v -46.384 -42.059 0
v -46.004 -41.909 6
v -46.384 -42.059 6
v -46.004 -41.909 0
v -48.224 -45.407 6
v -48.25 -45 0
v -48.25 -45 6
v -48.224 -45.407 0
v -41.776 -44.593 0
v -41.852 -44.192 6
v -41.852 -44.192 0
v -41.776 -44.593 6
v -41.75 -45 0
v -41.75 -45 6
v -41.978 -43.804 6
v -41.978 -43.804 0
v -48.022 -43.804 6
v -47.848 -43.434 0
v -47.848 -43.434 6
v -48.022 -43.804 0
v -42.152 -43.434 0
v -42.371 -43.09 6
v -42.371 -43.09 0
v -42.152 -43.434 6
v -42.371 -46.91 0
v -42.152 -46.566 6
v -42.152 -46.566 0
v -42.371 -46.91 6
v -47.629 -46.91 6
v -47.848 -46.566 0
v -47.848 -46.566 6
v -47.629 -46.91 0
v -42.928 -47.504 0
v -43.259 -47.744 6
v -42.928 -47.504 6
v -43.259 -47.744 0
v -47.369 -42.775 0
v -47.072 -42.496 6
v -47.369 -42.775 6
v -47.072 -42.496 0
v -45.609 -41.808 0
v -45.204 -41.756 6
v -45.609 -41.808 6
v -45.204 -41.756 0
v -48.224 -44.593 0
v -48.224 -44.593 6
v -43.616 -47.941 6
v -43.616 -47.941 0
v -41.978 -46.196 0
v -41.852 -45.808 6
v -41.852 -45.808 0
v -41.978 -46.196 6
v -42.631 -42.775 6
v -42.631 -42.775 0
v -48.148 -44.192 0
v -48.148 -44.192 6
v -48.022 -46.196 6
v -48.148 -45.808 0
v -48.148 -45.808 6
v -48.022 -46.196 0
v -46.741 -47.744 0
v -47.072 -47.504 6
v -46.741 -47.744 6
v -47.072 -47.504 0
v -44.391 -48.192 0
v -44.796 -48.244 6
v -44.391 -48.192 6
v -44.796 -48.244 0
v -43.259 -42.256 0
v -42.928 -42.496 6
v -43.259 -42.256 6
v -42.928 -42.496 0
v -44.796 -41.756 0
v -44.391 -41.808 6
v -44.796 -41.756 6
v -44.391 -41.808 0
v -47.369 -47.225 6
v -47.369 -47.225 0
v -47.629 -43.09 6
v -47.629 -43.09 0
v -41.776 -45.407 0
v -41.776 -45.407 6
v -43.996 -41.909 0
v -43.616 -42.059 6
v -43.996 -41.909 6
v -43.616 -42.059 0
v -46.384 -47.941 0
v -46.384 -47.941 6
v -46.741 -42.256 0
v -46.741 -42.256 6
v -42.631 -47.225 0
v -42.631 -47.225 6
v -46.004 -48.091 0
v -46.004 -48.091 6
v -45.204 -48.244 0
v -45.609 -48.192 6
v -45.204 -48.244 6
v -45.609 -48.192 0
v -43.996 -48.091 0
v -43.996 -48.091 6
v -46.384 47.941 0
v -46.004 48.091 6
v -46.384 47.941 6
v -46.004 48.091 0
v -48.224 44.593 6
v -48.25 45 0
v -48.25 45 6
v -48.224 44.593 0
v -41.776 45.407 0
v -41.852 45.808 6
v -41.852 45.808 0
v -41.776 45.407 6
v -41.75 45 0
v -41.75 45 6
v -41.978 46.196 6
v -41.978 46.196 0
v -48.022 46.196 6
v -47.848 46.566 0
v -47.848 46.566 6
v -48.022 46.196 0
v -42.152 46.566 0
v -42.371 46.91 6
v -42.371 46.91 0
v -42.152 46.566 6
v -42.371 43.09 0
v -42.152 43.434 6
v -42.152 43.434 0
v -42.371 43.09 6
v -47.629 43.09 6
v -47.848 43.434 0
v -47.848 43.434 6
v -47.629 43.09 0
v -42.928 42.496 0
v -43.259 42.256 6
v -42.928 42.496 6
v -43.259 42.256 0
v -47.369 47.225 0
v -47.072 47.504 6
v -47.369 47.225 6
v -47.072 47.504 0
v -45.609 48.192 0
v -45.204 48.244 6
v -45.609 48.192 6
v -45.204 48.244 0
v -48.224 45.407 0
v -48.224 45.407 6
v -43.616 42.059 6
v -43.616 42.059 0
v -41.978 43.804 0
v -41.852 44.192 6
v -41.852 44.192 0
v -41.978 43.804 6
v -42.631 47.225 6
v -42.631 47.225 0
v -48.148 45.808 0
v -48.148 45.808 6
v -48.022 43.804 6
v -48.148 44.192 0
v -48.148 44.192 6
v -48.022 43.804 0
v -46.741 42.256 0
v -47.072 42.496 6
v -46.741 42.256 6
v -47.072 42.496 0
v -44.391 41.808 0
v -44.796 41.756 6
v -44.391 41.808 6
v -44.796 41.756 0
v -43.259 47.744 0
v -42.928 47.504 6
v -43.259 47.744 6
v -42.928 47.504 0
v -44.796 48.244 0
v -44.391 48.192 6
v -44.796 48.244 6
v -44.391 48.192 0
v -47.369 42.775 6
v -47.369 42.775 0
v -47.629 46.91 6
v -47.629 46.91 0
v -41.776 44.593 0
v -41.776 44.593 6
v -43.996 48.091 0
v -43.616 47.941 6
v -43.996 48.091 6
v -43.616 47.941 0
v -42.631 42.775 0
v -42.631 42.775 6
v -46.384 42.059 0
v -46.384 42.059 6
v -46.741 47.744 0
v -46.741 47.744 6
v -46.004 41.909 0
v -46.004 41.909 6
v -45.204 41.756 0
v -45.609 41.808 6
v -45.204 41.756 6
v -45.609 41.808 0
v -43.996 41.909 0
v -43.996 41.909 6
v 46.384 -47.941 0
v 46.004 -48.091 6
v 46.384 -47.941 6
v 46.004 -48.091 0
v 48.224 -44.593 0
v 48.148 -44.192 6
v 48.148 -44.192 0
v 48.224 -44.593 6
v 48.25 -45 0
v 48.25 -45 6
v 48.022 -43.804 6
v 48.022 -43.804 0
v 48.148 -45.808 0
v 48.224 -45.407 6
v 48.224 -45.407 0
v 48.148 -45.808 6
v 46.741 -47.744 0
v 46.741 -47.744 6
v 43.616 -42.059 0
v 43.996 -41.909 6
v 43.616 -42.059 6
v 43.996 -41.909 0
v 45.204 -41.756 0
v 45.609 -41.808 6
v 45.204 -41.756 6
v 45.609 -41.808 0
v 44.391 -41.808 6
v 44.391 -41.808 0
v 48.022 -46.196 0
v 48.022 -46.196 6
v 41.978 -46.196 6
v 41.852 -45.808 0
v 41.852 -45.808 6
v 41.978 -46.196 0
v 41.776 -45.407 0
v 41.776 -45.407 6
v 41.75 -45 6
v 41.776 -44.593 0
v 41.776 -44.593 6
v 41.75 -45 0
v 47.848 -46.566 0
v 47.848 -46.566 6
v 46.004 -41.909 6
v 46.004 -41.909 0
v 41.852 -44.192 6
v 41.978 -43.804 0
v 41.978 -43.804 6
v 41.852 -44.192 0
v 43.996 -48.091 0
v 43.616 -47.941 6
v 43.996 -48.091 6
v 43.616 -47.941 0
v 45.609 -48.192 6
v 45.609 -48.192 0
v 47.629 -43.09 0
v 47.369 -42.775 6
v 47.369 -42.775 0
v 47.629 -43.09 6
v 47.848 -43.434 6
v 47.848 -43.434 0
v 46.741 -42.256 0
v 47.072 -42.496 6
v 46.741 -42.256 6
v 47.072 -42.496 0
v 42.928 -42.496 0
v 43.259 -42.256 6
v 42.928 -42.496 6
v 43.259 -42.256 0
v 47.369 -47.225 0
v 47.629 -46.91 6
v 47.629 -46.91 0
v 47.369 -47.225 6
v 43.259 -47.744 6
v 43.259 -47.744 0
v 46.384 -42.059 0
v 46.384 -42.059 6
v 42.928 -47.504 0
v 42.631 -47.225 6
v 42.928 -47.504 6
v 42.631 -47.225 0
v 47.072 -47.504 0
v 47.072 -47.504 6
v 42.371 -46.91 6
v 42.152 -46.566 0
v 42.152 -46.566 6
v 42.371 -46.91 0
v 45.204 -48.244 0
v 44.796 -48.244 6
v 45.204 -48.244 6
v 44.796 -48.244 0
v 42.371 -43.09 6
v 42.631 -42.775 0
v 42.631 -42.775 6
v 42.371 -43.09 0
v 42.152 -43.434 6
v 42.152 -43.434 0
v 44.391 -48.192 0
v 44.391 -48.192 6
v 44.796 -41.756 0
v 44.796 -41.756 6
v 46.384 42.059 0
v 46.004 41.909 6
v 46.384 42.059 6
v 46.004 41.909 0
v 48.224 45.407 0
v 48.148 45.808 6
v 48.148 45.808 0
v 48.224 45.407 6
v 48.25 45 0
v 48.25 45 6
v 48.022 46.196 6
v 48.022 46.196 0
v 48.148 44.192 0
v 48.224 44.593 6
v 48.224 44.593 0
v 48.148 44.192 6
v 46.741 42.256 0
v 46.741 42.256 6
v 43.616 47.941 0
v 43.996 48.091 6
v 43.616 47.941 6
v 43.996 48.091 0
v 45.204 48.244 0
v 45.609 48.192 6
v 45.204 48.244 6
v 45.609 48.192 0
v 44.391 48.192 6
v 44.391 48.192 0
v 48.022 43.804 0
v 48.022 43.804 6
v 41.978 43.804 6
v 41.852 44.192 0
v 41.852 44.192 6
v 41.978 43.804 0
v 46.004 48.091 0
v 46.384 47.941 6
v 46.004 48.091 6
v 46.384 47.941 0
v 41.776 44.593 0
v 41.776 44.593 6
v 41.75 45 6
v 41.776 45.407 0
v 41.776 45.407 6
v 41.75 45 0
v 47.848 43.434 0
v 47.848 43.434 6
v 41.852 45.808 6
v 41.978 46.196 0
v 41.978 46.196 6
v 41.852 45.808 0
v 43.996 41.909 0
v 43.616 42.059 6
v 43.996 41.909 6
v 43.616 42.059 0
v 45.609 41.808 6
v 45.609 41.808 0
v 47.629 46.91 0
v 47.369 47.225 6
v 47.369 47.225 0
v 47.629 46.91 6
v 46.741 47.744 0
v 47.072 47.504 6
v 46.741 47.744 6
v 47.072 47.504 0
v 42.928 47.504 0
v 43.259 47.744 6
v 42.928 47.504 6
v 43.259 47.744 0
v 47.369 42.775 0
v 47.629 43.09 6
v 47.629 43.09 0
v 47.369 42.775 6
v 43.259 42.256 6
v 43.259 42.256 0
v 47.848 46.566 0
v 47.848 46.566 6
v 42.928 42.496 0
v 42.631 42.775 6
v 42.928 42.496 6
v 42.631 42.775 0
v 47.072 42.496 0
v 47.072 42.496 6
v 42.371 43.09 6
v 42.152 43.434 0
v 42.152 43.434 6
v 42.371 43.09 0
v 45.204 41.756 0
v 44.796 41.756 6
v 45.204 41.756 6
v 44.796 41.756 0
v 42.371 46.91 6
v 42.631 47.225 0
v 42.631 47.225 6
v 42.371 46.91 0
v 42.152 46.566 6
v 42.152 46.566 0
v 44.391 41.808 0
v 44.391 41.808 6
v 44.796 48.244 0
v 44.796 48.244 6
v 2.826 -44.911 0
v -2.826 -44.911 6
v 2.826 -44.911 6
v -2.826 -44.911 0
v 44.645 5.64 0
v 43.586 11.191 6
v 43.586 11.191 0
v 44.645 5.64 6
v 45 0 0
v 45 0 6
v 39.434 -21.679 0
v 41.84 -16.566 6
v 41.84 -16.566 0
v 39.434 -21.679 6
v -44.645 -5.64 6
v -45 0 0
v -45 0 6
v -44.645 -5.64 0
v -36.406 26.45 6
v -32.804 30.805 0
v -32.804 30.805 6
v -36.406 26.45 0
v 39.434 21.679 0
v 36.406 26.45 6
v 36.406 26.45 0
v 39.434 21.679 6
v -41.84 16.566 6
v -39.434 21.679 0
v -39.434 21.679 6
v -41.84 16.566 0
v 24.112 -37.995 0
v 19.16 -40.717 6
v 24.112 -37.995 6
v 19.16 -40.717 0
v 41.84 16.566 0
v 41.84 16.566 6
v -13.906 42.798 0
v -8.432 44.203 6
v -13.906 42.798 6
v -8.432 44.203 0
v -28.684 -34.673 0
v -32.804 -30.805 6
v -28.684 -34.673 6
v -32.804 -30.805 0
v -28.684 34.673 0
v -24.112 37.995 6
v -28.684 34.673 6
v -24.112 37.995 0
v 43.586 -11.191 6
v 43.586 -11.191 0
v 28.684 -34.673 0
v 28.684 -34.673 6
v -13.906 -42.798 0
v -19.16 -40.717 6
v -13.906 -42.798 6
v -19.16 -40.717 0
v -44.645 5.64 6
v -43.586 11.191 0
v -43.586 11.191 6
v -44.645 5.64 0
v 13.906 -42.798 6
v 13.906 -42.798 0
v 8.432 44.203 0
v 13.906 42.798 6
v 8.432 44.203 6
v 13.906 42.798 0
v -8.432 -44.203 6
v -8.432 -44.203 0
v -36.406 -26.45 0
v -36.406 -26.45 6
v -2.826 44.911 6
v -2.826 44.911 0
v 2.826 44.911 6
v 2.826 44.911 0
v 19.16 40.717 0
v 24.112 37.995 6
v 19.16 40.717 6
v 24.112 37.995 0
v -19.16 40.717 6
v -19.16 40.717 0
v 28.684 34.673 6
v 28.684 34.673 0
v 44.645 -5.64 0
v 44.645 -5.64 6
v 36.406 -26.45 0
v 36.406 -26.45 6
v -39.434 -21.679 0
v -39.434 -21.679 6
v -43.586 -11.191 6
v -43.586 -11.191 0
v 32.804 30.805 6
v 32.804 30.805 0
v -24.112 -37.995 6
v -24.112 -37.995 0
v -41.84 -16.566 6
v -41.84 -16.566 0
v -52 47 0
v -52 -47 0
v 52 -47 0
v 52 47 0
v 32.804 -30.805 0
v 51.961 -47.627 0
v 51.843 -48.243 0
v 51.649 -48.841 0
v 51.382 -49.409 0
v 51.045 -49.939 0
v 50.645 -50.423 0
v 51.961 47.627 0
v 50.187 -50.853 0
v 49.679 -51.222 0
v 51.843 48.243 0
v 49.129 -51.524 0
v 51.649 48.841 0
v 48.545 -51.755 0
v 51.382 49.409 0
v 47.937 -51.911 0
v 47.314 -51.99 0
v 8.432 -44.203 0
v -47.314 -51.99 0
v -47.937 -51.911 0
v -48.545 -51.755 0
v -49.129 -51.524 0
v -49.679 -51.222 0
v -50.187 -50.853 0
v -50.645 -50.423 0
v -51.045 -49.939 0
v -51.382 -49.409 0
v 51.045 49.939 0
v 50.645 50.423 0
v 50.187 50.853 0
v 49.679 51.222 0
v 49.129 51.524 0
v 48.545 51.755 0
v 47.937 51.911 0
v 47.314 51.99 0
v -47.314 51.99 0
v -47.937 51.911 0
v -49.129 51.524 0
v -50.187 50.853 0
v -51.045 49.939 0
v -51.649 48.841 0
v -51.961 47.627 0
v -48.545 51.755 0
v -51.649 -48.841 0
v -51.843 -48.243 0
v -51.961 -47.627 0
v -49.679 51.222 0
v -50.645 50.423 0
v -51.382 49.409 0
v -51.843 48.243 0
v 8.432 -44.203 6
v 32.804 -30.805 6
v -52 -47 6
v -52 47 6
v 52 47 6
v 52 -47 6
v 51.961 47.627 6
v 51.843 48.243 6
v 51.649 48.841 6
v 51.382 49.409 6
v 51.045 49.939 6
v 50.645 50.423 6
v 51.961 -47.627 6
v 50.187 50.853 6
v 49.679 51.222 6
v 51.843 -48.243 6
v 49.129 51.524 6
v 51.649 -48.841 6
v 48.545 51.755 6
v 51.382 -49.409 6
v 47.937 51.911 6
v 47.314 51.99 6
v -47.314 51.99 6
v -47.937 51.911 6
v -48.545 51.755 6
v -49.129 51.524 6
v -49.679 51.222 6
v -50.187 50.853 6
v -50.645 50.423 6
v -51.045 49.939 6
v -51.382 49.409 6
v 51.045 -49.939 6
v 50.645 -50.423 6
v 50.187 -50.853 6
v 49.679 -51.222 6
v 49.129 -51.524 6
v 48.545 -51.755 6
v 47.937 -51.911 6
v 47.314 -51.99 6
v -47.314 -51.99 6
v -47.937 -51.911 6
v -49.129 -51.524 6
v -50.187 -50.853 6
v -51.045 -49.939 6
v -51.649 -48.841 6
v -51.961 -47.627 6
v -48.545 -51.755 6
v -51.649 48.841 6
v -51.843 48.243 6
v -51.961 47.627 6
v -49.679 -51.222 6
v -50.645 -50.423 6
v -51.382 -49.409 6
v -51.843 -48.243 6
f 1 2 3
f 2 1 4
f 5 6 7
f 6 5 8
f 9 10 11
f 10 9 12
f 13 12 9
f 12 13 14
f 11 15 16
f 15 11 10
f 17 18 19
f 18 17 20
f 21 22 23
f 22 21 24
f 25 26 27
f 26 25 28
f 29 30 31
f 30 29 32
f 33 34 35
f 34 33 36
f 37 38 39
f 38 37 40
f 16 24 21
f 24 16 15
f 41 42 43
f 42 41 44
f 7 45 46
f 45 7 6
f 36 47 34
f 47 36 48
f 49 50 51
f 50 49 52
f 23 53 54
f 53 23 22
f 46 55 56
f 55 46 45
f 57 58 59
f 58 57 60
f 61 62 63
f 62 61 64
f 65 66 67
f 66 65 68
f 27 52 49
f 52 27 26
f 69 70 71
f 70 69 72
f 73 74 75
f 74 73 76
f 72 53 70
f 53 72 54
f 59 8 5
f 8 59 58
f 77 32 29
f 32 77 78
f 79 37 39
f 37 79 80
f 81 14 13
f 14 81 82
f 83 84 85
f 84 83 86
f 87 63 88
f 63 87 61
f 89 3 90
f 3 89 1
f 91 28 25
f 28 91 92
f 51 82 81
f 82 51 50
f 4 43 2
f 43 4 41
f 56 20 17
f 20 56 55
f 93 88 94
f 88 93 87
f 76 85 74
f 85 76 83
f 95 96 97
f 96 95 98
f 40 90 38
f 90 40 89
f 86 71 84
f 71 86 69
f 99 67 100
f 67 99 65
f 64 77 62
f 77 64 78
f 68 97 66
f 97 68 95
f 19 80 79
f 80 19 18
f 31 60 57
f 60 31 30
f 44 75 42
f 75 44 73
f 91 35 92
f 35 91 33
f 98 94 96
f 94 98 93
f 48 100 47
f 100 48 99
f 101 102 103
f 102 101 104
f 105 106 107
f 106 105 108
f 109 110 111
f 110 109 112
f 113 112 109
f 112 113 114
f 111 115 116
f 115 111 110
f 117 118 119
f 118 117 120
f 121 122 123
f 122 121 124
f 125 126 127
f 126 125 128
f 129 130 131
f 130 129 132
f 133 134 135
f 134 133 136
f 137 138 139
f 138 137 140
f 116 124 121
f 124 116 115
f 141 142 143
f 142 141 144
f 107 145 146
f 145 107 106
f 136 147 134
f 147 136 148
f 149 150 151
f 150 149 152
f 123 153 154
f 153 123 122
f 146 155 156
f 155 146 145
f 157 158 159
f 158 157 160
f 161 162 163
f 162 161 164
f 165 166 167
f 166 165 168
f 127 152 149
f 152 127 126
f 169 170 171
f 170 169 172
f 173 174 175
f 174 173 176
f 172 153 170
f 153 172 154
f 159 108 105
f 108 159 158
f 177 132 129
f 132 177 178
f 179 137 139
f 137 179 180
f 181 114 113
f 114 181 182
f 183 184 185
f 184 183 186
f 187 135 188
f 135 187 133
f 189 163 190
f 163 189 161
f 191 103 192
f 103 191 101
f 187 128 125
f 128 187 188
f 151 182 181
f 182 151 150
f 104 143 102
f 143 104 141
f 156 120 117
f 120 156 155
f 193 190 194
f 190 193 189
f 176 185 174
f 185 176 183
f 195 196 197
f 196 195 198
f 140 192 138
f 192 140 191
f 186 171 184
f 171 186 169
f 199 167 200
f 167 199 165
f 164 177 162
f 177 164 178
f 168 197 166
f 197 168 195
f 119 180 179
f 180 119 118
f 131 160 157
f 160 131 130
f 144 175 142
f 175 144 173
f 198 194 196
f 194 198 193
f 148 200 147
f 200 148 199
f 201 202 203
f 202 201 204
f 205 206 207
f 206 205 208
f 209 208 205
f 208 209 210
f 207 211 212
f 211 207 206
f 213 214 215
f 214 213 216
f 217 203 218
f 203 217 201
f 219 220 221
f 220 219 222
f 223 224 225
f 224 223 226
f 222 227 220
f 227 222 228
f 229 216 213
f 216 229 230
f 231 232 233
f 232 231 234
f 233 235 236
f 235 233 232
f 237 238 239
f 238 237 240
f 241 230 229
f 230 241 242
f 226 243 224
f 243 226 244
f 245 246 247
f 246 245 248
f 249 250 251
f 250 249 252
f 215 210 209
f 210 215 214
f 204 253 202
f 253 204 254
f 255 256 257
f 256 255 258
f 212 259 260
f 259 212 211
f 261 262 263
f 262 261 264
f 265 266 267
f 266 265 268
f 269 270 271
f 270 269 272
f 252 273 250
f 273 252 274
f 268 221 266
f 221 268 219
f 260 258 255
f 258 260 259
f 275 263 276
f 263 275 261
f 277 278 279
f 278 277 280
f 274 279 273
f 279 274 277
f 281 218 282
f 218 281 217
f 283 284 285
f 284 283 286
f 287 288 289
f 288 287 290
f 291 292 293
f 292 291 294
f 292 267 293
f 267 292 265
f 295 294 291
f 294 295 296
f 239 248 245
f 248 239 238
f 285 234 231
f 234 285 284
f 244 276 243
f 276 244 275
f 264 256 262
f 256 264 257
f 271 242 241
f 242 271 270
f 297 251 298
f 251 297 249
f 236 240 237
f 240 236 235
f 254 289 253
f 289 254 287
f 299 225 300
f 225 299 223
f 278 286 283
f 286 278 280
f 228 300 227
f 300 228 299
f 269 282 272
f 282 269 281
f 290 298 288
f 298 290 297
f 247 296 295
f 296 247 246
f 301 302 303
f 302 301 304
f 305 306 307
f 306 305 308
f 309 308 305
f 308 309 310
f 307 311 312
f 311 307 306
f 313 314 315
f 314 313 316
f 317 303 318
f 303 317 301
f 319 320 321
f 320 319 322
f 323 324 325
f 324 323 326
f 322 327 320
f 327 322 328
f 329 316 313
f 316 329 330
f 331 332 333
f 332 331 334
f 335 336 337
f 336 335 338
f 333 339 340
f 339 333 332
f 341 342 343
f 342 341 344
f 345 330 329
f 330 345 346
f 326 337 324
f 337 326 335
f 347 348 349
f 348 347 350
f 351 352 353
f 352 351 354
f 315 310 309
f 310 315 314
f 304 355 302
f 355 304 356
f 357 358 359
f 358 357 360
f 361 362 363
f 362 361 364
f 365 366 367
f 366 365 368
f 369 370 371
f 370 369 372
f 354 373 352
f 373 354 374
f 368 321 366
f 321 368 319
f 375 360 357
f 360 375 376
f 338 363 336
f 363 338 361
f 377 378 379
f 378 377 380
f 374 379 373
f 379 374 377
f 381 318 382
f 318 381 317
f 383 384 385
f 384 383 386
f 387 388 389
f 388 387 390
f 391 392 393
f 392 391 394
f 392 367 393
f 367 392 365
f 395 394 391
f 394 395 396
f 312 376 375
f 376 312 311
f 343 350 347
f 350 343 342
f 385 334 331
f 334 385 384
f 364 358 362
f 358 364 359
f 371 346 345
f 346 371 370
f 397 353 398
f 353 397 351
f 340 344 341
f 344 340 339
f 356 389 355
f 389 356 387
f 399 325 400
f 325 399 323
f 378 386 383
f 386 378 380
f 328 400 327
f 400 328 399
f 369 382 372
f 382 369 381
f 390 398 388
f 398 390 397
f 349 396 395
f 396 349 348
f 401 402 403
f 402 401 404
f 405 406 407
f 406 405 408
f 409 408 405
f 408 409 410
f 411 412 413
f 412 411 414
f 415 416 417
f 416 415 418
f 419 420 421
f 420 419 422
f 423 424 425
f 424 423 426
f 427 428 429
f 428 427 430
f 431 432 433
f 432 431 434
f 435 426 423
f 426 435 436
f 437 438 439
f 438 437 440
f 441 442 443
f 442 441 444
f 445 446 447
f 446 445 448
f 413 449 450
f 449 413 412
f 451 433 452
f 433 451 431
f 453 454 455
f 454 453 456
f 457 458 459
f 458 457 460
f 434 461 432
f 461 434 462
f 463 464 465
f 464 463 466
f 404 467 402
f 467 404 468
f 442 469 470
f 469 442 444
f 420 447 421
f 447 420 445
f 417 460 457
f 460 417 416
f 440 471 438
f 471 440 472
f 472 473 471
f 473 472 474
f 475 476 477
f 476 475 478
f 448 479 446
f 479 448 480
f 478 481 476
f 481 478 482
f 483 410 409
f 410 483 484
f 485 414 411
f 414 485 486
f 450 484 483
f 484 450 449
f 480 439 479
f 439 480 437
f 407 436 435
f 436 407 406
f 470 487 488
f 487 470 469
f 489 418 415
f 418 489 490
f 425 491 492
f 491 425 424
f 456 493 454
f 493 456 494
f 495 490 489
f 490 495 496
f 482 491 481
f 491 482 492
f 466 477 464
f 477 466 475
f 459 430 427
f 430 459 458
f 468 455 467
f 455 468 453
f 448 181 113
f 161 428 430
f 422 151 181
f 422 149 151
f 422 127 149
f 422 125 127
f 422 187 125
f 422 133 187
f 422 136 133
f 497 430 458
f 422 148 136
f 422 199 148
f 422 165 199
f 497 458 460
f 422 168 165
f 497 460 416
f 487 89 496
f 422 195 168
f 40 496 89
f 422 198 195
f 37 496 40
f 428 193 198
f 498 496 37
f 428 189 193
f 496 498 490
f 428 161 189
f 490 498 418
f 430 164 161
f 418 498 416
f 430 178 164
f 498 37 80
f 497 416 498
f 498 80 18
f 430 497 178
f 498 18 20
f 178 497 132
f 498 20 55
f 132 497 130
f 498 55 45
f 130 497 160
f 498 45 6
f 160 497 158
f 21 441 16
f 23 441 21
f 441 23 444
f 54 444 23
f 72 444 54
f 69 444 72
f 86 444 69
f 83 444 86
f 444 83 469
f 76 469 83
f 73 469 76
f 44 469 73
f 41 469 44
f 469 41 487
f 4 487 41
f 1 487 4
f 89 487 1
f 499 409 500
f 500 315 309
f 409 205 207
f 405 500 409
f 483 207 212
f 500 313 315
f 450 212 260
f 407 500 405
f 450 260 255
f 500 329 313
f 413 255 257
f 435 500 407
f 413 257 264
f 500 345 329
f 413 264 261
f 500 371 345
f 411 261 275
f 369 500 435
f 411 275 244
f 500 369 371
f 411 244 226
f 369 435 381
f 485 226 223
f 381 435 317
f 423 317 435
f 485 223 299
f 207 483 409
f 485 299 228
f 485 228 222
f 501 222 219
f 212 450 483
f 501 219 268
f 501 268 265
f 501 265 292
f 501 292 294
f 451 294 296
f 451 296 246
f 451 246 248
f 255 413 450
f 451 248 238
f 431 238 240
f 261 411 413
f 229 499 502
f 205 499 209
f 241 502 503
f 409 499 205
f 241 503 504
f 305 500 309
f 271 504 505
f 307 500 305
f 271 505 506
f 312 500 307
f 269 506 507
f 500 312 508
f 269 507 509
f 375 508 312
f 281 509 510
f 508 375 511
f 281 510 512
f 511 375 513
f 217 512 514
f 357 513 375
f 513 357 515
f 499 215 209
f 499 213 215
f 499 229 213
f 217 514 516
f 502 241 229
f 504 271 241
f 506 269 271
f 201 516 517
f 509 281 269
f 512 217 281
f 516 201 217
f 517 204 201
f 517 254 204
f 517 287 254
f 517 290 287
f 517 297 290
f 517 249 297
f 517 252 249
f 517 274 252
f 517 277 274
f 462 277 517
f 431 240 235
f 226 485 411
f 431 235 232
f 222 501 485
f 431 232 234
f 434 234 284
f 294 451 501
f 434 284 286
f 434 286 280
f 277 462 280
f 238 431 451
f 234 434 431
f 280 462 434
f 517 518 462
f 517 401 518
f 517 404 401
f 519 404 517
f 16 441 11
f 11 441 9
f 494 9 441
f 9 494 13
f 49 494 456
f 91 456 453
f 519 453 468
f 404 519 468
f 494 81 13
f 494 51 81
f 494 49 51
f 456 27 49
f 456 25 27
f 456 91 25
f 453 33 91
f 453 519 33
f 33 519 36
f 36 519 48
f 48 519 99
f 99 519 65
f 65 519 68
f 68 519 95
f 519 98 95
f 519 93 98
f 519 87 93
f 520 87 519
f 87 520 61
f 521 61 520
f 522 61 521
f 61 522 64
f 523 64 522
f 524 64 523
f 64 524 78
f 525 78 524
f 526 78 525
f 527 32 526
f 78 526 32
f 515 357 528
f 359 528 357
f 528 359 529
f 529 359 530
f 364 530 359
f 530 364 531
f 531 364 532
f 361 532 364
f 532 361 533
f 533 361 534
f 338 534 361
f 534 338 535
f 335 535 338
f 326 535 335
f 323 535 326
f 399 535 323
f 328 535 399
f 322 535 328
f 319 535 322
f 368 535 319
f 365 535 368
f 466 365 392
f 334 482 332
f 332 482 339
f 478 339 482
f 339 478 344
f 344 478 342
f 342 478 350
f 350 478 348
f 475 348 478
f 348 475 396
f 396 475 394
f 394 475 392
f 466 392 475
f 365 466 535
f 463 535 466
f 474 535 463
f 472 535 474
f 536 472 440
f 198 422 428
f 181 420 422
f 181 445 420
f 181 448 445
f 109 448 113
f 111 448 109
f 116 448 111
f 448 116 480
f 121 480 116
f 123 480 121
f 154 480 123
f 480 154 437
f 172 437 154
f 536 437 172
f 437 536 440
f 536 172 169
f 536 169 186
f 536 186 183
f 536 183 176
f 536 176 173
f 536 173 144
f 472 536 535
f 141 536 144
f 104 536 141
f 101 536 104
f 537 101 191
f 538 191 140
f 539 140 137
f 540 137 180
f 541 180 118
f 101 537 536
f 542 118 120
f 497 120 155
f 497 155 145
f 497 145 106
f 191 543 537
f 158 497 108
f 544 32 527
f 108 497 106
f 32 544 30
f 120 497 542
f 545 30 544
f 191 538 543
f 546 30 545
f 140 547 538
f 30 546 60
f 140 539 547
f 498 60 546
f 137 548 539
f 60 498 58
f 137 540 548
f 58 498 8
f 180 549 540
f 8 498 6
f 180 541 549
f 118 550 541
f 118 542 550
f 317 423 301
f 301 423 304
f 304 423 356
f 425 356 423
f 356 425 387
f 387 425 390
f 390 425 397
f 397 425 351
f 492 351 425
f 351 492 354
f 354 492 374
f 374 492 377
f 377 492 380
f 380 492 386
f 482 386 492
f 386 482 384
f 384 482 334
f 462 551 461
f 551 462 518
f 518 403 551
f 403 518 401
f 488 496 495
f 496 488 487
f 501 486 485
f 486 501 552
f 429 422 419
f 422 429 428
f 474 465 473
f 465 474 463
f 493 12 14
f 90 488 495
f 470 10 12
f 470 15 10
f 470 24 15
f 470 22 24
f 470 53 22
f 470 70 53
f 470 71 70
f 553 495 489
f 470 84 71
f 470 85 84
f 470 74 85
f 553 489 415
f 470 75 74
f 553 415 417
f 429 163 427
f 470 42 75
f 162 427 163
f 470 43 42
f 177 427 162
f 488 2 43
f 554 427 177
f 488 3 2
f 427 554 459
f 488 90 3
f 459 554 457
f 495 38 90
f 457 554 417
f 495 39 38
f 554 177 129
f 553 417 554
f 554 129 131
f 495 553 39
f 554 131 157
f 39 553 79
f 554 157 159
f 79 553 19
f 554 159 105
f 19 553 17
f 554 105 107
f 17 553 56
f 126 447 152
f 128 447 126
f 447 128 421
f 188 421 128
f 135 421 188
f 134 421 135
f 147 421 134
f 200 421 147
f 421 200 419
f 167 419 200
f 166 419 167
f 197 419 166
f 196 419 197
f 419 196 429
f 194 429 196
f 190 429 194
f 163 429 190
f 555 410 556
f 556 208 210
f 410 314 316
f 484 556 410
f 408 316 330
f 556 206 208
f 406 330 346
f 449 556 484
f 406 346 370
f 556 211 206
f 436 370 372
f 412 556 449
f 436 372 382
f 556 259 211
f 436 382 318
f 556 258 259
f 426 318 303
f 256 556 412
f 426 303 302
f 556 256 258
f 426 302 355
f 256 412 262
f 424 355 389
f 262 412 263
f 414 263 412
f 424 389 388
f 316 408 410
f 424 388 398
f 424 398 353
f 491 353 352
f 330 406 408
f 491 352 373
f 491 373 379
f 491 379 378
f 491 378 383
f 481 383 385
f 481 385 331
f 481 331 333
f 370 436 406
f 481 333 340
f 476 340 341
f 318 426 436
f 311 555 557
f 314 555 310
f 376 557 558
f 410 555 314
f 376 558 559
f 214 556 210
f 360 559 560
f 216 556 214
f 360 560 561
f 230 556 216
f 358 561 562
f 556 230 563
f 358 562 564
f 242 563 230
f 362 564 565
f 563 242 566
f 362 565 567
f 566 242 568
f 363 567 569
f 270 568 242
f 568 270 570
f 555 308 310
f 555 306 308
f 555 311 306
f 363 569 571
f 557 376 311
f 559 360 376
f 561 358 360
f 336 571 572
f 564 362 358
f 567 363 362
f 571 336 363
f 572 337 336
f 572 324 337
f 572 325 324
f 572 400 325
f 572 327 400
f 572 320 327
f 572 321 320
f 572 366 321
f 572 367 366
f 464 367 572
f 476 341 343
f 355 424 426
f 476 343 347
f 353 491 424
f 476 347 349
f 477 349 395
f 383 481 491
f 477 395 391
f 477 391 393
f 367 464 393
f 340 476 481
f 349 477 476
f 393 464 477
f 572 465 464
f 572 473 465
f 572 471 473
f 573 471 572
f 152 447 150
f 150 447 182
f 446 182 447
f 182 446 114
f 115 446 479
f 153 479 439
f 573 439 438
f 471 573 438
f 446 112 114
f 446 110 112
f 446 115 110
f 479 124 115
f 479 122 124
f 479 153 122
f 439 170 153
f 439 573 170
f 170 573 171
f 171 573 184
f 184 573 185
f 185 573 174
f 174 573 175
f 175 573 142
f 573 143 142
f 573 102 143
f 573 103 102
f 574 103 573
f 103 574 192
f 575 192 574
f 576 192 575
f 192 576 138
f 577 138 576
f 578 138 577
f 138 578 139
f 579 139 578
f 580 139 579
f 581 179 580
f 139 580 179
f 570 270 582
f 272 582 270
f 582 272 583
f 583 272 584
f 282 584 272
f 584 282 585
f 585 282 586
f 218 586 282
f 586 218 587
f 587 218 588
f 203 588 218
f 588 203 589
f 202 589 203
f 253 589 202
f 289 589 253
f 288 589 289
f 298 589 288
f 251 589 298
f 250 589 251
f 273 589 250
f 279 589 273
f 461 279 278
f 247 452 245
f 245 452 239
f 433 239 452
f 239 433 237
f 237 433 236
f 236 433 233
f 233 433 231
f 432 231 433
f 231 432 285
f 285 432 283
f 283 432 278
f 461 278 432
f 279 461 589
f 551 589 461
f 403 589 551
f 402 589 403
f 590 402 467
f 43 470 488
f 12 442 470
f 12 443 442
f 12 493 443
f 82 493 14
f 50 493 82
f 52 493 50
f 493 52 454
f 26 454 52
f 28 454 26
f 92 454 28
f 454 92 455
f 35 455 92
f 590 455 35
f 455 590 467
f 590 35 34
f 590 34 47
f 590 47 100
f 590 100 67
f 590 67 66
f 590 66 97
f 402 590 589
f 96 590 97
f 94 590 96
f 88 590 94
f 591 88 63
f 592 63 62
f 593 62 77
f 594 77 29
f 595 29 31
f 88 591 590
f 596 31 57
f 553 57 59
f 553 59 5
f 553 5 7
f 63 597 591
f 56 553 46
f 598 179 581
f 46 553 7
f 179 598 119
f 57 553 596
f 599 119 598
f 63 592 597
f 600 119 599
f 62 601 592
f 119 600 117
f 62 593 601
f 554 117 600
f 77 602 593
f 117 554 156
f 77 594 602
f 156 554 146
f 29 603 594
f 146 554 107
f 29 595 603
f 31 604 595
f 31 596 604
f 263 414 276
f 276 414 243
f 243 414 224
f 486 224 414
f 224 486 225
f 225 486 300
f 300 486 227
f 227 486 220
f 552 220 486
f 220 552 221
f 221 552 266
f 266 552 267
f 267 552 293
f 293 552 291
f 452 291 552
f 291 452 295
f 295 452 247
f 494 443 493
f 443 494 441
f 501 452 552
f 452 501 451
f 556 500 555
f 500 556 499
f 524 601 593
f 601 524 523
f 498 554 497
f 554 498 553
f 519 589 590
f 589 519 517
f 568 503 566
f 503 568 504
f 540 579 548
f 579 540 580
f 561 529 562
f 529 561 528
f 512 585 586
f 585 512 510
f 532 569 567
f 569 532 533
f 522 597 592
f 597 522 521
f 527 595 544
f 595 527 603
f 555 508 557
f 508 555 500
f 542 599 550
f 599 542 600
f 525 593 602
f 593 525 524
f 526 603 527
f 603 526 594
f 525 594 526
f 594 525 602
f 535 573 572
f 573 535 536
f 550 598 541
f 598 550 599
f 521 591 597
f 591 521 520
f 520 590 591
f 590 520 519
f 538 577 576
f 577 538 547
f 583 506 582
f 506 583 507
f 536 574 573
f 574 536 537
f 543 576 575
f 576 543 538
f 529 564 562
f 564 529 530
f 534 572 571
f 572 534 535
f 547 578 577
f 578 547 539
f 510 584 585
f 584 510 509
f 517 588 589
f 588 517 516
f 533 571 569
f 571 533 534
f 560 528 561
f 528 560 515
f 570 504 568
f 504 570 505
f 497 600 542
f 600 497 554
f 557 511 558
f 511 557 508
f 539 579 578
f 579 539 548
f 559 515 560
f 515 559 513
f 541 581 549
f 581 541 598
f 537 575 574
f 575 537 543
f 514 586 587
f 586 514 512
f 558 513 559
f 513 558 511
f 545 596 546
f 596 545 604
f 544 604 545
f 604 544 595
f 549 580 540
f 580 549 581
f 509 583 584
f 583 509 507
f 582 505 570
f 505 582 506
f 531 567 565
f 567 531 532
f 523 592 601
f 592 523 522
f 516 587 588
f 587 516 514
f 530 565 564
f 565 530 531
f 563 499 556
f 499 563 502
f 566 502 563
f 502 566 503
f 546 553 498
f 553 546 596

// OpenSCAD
$fn = 50;

difference() {
	union() {
		hull() {
			translate(v = [-47.0, 47.0, 0]) {
				cylinder(h = 6, r = 5);
			}
			translate(v = [47.0, 47.0, 0]) {
				cylinder(h = 6, r = 5);
			}
			translate(v = [-47.0, -47.0, 0]) {
				cylinder(h = 6, r = 5);
			}
			translate(v = [47.0, -47.0, 0]) {
				cylinder(h = 6, r = 5);
			}
		}
	}
	union() {
		translate(v = [-45.0, -45.0, -100.0]) {
			cylinder(h = 200, r = 3.25);
		}
		translate(v = [-45.0, 45.0, -100.0]) {
			cylinder(h = 200, r = 3.25);
		}
		translate(v = [45.0, -45.0, -100.0]) {
			cylinder(h = 200, r = 3.25);
		}
		translate(v = [45.0, 45.0, -100.0]) {
			cylinder(h = 200, r = 3.25);
		}
		translate(v = [-45.0, -45.0, -100.0]) {
			cylinder(h = 200, r = 1.8);
		}
		translate(v = [-45.0, 45.0, -100.0]) {
			cylinder(h = 200, r = 1.8);
		}
		translate(v = [45.0, -45.0, -100.0]) {
			cylinder(h = 200, r = 1.8);
		}
		translate(v = [45.0, 45.0, -100.0]) {
			cylinder(h = 200, r = 1.8);
		}
		cylinder(h = 6, r = 45.0);
	}
}
